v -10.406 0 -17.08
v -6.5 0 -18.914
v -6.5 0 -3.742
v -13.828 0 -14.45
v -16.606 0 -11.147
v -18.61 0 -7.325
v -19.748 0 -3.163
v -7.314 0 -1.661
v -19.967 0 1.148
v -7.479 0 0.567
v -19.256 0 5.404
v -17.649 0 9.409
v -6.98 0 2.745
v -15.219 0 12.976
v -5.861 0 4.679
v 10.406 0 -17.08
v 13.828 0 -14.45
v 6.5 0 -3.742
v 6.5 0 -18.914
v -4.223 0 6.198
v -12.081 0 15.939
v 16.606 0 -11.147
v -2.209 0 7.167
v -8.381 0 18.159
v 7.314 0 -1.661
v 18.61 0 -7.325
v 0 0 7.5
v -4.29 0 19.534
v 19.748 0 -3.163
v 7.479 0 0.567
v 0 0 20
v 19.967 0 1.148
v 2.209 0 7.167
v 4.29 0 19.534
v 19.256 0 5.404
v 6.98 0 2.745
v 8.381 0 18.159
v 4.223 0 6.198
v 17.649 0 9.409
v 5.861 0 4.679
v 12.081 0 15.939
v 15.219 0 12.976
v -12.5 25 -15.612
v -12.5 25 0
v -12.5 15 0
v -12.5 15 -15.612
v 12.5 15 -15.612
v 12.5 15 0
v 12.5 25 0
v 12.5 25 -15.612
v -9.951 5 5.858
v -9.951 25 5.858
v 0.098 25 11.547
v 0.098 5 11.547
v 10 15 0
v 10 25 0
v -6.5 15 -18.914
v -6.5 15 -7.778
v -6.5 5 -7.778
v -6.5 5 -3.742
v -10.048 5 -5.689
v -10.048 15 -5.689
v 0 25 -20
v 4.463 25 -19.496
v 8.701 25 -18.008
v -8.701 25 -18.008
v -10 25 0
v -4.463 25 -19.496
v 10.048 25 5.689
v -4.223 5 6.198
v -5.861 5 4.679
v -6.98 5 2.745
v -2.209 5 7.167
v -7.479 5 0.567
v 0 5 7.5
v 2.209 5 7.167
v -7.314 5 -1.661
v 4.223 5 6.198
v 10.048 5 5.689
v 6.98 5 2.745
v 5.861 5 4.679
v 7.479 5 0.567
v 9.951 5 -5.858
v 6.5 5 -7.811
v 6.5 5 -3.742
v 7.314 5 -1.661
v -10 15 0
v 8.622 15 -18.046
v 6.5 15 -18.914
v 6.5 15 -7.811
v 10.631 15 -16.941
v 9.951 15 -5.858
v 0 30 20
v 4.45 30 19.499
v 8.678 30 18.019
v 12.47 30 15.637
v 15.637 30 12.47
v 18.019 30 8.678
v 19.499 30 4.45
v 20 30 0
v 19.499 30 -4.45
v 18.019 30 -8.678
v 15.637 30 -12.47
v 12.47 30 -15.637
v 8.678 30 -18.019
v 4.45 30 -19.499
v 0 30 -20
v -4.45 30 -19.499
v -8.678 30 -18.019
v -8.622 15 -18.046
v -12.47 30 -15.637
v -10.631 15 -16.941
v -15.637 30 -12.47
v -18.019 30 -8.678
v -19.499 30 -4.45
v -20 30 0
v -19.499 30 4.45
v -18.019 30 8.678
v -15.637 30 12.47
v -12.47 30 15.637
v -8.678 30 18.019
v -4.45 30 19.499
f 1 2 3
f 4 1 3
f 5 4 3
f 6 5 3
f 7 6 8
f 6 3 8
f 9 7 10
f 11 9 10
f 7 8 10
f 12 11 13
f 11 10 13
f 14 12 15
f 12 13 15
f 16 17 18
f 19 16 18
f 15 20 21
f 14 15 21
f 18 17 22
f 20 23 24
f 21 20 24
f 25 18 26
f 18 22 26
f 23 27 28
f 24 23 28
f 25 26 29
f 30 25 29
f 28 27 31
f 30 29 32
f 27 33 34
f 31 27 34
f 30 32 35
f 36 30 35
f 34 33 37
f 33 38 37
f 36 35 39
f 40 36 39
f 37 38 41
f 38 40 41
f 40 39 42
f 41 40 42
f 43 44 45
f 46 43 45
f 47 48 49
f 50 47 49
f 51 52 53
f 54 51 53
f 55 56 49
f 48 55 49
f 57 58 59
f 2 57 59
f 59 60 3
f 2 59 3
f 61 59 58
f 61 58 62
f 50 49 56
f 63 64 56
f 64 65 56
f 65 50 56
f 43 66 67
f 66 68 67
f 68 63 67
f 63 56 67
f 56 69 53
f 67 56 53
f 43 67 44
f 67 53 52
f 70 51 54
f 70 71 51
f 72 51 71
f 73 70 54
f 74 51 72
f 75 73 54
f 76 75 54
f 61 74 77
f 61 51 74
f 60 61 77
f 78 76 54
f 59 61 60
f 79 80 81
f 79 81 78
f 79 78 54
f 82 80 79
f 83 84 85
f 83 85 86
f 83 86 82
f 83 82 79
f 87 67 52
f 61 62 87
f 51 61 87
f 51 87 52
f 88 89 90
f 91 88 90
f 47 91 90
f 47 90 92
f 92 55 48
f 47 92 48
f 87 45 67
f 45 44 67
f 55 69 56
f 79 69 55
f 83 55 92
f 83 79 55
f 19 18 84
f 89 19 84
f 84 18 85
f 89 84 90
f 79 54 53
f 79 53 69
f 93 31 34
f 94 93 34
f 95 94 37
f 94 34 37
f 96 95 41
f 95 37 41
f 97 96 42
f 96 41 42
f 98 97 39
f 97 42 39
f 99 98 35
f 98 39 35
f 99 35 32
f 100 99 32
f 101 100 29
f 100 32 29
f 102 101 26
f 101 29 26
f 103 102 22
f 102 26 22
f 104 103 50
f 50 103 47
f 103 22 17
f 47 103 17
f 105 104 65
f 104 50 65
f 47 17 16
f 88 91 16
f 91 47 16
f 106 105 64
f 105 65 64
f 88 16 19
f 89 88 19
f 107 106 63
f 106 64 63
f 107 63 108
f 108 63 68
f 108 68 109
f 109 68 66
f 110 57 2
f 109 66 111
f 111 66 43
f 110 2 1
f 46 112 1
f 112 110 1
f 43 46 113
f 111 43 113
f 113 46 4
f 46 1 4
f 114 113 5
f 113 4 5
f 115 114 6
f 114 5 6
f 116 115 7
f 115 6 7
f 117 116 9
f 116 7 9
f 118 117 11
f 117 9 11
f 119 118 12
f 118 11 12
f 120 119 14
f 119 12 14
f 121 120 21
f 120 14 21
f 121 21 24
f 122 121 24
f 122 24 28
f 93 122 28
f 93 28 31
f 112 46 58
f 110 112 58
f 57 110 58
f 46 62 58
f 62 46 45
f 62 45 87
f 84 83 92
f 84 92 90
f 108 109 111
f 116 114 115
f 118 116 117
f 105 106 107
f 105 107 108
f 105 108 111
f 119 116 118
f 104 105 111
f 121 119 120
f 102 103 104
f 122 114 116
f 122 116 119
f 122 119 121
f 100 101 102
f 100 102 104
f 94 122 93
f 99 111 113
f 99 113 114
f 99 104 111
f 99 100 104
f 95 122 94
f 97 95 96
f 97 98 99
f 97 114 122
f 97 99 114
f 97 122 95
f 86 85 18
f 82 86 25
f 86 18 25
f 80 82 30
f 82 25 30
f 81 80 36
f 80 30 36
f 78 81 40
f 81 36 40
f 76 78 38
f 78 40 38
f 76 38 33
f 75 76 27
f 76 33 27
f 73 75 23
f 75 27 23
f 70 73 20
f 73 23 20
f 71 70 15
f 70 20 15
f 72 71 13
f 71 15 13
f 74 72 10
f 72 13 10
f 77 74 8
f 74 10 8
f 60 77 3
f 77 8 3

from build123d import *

# Parameters (mm, degrees)
SKETCH1_R           = 20
BOSS_EXTRUDE1_DEPTH = 10
CUT_EXTRUDE2_DEPTH  = 5
SKETCH5_R           = 20
BOSS_EXTRUDE3_DEPTH = 15
SKETCH6_R           = 20
BOSS_EXTRUDE4_DEPTH = 5
SKETCH7_R           = 7.5
CUT_EXTRUDE3_DEPTH  = 15
CUT_EXTRUDE4_DEPTH  = 42.231056256


with BuildPart() as part:
    # Sketch1 → Boss-Extrude1 (new body)
    with BuildSketch(Plane(origin=(0, 0, 0), x_dir=(1, 0, 0), z_dir=(0, 1, 0))):
        with Locations(Location((0, 0, 0), (0, 0, 270))):
            Circle(SKETCH1_R)
    extrude(amount=BOSS_EXTRUDE1_DEPTH)

    # Sketch2 → Cut-Extrude2 (cut)
    with BuildSketch(Plane(origin=(0, 10, 0), x_dir=(1, 0, 0), z_dir=(0, 1, 0))):
        Polygon((10.04843053, -5.688794004), (9.950855389, 5.857799105), (-0.097575141, 11.546593109), (-10.04843053, 5.688794004), (-9.950855389, -5.857799105), (0.097575141, -11.546593109), align=None)
    extrude(amount=-CUT_EXTRUDE2_DEPTH, mode=Mode.SUBTRACT)

    # Sketch5 → Boss-Extrude3 (add)
    with BuildSketch(Plane(origin=(0, 10, 0), x_dir=(1, 0, 0), z_dir=(0, 1, 0))):
        with Locations(Location((0, 0, 0), (0, 0, 270))):
            Circle(SKETCH5_R)
        Polygon((-9.950855389, -5.857799105), (0.097575141, -11.546593109), (10.04843053, -5.688794004), (9.950855389, 5.857799105), (-0.097575141, 11.546593109), (-10.04843053, 5.688794004), align=None, mode=Mode.SUBTRACT)
    extrude(amount=BOSS_EXTRUDE3_DEPTH)

    # Sketch6 → Boss-Extrude4 (add)
    with BuildSketch(Plane(origin=(0, 25, 0), x_dir=(1, 0, 0), z_dir=(0, 1, 0))):
        with Locations(Location((0, 0, 0), (0, 0, 270))):
            Circle(SKETCH6_R)
    extrude(amount=BOSS_EXTRUDE4_DEPTH)

    # Sketch7 → Cut-Extrude3 (cut)
    with BuildSketch(Plane.XZ):
        with Locations(Location((0, 0, 0), (0, 0, 270))):
            Circle(SKETCH7_R)
    extrude(amount=-CUT_EXTRUDE3_DEPTH, mode=Mode.SUBTRACT)

    # Sketch8 → Cut-Extrude4 (cut, through all)
    with BuildSketch(Plane.XY):
        Polygon((-6.5, 15), (-6.5, 0), (6.5, 0), (6.5, 15), (12.5, 15), (12.5, 25), (-12.5, 25), (-12.5, 15), align=None)
    extrude(amount=-CUT_EXTRUDE4_DEPTH, mode=Mode.SUBTRACT)


solid = part.part
